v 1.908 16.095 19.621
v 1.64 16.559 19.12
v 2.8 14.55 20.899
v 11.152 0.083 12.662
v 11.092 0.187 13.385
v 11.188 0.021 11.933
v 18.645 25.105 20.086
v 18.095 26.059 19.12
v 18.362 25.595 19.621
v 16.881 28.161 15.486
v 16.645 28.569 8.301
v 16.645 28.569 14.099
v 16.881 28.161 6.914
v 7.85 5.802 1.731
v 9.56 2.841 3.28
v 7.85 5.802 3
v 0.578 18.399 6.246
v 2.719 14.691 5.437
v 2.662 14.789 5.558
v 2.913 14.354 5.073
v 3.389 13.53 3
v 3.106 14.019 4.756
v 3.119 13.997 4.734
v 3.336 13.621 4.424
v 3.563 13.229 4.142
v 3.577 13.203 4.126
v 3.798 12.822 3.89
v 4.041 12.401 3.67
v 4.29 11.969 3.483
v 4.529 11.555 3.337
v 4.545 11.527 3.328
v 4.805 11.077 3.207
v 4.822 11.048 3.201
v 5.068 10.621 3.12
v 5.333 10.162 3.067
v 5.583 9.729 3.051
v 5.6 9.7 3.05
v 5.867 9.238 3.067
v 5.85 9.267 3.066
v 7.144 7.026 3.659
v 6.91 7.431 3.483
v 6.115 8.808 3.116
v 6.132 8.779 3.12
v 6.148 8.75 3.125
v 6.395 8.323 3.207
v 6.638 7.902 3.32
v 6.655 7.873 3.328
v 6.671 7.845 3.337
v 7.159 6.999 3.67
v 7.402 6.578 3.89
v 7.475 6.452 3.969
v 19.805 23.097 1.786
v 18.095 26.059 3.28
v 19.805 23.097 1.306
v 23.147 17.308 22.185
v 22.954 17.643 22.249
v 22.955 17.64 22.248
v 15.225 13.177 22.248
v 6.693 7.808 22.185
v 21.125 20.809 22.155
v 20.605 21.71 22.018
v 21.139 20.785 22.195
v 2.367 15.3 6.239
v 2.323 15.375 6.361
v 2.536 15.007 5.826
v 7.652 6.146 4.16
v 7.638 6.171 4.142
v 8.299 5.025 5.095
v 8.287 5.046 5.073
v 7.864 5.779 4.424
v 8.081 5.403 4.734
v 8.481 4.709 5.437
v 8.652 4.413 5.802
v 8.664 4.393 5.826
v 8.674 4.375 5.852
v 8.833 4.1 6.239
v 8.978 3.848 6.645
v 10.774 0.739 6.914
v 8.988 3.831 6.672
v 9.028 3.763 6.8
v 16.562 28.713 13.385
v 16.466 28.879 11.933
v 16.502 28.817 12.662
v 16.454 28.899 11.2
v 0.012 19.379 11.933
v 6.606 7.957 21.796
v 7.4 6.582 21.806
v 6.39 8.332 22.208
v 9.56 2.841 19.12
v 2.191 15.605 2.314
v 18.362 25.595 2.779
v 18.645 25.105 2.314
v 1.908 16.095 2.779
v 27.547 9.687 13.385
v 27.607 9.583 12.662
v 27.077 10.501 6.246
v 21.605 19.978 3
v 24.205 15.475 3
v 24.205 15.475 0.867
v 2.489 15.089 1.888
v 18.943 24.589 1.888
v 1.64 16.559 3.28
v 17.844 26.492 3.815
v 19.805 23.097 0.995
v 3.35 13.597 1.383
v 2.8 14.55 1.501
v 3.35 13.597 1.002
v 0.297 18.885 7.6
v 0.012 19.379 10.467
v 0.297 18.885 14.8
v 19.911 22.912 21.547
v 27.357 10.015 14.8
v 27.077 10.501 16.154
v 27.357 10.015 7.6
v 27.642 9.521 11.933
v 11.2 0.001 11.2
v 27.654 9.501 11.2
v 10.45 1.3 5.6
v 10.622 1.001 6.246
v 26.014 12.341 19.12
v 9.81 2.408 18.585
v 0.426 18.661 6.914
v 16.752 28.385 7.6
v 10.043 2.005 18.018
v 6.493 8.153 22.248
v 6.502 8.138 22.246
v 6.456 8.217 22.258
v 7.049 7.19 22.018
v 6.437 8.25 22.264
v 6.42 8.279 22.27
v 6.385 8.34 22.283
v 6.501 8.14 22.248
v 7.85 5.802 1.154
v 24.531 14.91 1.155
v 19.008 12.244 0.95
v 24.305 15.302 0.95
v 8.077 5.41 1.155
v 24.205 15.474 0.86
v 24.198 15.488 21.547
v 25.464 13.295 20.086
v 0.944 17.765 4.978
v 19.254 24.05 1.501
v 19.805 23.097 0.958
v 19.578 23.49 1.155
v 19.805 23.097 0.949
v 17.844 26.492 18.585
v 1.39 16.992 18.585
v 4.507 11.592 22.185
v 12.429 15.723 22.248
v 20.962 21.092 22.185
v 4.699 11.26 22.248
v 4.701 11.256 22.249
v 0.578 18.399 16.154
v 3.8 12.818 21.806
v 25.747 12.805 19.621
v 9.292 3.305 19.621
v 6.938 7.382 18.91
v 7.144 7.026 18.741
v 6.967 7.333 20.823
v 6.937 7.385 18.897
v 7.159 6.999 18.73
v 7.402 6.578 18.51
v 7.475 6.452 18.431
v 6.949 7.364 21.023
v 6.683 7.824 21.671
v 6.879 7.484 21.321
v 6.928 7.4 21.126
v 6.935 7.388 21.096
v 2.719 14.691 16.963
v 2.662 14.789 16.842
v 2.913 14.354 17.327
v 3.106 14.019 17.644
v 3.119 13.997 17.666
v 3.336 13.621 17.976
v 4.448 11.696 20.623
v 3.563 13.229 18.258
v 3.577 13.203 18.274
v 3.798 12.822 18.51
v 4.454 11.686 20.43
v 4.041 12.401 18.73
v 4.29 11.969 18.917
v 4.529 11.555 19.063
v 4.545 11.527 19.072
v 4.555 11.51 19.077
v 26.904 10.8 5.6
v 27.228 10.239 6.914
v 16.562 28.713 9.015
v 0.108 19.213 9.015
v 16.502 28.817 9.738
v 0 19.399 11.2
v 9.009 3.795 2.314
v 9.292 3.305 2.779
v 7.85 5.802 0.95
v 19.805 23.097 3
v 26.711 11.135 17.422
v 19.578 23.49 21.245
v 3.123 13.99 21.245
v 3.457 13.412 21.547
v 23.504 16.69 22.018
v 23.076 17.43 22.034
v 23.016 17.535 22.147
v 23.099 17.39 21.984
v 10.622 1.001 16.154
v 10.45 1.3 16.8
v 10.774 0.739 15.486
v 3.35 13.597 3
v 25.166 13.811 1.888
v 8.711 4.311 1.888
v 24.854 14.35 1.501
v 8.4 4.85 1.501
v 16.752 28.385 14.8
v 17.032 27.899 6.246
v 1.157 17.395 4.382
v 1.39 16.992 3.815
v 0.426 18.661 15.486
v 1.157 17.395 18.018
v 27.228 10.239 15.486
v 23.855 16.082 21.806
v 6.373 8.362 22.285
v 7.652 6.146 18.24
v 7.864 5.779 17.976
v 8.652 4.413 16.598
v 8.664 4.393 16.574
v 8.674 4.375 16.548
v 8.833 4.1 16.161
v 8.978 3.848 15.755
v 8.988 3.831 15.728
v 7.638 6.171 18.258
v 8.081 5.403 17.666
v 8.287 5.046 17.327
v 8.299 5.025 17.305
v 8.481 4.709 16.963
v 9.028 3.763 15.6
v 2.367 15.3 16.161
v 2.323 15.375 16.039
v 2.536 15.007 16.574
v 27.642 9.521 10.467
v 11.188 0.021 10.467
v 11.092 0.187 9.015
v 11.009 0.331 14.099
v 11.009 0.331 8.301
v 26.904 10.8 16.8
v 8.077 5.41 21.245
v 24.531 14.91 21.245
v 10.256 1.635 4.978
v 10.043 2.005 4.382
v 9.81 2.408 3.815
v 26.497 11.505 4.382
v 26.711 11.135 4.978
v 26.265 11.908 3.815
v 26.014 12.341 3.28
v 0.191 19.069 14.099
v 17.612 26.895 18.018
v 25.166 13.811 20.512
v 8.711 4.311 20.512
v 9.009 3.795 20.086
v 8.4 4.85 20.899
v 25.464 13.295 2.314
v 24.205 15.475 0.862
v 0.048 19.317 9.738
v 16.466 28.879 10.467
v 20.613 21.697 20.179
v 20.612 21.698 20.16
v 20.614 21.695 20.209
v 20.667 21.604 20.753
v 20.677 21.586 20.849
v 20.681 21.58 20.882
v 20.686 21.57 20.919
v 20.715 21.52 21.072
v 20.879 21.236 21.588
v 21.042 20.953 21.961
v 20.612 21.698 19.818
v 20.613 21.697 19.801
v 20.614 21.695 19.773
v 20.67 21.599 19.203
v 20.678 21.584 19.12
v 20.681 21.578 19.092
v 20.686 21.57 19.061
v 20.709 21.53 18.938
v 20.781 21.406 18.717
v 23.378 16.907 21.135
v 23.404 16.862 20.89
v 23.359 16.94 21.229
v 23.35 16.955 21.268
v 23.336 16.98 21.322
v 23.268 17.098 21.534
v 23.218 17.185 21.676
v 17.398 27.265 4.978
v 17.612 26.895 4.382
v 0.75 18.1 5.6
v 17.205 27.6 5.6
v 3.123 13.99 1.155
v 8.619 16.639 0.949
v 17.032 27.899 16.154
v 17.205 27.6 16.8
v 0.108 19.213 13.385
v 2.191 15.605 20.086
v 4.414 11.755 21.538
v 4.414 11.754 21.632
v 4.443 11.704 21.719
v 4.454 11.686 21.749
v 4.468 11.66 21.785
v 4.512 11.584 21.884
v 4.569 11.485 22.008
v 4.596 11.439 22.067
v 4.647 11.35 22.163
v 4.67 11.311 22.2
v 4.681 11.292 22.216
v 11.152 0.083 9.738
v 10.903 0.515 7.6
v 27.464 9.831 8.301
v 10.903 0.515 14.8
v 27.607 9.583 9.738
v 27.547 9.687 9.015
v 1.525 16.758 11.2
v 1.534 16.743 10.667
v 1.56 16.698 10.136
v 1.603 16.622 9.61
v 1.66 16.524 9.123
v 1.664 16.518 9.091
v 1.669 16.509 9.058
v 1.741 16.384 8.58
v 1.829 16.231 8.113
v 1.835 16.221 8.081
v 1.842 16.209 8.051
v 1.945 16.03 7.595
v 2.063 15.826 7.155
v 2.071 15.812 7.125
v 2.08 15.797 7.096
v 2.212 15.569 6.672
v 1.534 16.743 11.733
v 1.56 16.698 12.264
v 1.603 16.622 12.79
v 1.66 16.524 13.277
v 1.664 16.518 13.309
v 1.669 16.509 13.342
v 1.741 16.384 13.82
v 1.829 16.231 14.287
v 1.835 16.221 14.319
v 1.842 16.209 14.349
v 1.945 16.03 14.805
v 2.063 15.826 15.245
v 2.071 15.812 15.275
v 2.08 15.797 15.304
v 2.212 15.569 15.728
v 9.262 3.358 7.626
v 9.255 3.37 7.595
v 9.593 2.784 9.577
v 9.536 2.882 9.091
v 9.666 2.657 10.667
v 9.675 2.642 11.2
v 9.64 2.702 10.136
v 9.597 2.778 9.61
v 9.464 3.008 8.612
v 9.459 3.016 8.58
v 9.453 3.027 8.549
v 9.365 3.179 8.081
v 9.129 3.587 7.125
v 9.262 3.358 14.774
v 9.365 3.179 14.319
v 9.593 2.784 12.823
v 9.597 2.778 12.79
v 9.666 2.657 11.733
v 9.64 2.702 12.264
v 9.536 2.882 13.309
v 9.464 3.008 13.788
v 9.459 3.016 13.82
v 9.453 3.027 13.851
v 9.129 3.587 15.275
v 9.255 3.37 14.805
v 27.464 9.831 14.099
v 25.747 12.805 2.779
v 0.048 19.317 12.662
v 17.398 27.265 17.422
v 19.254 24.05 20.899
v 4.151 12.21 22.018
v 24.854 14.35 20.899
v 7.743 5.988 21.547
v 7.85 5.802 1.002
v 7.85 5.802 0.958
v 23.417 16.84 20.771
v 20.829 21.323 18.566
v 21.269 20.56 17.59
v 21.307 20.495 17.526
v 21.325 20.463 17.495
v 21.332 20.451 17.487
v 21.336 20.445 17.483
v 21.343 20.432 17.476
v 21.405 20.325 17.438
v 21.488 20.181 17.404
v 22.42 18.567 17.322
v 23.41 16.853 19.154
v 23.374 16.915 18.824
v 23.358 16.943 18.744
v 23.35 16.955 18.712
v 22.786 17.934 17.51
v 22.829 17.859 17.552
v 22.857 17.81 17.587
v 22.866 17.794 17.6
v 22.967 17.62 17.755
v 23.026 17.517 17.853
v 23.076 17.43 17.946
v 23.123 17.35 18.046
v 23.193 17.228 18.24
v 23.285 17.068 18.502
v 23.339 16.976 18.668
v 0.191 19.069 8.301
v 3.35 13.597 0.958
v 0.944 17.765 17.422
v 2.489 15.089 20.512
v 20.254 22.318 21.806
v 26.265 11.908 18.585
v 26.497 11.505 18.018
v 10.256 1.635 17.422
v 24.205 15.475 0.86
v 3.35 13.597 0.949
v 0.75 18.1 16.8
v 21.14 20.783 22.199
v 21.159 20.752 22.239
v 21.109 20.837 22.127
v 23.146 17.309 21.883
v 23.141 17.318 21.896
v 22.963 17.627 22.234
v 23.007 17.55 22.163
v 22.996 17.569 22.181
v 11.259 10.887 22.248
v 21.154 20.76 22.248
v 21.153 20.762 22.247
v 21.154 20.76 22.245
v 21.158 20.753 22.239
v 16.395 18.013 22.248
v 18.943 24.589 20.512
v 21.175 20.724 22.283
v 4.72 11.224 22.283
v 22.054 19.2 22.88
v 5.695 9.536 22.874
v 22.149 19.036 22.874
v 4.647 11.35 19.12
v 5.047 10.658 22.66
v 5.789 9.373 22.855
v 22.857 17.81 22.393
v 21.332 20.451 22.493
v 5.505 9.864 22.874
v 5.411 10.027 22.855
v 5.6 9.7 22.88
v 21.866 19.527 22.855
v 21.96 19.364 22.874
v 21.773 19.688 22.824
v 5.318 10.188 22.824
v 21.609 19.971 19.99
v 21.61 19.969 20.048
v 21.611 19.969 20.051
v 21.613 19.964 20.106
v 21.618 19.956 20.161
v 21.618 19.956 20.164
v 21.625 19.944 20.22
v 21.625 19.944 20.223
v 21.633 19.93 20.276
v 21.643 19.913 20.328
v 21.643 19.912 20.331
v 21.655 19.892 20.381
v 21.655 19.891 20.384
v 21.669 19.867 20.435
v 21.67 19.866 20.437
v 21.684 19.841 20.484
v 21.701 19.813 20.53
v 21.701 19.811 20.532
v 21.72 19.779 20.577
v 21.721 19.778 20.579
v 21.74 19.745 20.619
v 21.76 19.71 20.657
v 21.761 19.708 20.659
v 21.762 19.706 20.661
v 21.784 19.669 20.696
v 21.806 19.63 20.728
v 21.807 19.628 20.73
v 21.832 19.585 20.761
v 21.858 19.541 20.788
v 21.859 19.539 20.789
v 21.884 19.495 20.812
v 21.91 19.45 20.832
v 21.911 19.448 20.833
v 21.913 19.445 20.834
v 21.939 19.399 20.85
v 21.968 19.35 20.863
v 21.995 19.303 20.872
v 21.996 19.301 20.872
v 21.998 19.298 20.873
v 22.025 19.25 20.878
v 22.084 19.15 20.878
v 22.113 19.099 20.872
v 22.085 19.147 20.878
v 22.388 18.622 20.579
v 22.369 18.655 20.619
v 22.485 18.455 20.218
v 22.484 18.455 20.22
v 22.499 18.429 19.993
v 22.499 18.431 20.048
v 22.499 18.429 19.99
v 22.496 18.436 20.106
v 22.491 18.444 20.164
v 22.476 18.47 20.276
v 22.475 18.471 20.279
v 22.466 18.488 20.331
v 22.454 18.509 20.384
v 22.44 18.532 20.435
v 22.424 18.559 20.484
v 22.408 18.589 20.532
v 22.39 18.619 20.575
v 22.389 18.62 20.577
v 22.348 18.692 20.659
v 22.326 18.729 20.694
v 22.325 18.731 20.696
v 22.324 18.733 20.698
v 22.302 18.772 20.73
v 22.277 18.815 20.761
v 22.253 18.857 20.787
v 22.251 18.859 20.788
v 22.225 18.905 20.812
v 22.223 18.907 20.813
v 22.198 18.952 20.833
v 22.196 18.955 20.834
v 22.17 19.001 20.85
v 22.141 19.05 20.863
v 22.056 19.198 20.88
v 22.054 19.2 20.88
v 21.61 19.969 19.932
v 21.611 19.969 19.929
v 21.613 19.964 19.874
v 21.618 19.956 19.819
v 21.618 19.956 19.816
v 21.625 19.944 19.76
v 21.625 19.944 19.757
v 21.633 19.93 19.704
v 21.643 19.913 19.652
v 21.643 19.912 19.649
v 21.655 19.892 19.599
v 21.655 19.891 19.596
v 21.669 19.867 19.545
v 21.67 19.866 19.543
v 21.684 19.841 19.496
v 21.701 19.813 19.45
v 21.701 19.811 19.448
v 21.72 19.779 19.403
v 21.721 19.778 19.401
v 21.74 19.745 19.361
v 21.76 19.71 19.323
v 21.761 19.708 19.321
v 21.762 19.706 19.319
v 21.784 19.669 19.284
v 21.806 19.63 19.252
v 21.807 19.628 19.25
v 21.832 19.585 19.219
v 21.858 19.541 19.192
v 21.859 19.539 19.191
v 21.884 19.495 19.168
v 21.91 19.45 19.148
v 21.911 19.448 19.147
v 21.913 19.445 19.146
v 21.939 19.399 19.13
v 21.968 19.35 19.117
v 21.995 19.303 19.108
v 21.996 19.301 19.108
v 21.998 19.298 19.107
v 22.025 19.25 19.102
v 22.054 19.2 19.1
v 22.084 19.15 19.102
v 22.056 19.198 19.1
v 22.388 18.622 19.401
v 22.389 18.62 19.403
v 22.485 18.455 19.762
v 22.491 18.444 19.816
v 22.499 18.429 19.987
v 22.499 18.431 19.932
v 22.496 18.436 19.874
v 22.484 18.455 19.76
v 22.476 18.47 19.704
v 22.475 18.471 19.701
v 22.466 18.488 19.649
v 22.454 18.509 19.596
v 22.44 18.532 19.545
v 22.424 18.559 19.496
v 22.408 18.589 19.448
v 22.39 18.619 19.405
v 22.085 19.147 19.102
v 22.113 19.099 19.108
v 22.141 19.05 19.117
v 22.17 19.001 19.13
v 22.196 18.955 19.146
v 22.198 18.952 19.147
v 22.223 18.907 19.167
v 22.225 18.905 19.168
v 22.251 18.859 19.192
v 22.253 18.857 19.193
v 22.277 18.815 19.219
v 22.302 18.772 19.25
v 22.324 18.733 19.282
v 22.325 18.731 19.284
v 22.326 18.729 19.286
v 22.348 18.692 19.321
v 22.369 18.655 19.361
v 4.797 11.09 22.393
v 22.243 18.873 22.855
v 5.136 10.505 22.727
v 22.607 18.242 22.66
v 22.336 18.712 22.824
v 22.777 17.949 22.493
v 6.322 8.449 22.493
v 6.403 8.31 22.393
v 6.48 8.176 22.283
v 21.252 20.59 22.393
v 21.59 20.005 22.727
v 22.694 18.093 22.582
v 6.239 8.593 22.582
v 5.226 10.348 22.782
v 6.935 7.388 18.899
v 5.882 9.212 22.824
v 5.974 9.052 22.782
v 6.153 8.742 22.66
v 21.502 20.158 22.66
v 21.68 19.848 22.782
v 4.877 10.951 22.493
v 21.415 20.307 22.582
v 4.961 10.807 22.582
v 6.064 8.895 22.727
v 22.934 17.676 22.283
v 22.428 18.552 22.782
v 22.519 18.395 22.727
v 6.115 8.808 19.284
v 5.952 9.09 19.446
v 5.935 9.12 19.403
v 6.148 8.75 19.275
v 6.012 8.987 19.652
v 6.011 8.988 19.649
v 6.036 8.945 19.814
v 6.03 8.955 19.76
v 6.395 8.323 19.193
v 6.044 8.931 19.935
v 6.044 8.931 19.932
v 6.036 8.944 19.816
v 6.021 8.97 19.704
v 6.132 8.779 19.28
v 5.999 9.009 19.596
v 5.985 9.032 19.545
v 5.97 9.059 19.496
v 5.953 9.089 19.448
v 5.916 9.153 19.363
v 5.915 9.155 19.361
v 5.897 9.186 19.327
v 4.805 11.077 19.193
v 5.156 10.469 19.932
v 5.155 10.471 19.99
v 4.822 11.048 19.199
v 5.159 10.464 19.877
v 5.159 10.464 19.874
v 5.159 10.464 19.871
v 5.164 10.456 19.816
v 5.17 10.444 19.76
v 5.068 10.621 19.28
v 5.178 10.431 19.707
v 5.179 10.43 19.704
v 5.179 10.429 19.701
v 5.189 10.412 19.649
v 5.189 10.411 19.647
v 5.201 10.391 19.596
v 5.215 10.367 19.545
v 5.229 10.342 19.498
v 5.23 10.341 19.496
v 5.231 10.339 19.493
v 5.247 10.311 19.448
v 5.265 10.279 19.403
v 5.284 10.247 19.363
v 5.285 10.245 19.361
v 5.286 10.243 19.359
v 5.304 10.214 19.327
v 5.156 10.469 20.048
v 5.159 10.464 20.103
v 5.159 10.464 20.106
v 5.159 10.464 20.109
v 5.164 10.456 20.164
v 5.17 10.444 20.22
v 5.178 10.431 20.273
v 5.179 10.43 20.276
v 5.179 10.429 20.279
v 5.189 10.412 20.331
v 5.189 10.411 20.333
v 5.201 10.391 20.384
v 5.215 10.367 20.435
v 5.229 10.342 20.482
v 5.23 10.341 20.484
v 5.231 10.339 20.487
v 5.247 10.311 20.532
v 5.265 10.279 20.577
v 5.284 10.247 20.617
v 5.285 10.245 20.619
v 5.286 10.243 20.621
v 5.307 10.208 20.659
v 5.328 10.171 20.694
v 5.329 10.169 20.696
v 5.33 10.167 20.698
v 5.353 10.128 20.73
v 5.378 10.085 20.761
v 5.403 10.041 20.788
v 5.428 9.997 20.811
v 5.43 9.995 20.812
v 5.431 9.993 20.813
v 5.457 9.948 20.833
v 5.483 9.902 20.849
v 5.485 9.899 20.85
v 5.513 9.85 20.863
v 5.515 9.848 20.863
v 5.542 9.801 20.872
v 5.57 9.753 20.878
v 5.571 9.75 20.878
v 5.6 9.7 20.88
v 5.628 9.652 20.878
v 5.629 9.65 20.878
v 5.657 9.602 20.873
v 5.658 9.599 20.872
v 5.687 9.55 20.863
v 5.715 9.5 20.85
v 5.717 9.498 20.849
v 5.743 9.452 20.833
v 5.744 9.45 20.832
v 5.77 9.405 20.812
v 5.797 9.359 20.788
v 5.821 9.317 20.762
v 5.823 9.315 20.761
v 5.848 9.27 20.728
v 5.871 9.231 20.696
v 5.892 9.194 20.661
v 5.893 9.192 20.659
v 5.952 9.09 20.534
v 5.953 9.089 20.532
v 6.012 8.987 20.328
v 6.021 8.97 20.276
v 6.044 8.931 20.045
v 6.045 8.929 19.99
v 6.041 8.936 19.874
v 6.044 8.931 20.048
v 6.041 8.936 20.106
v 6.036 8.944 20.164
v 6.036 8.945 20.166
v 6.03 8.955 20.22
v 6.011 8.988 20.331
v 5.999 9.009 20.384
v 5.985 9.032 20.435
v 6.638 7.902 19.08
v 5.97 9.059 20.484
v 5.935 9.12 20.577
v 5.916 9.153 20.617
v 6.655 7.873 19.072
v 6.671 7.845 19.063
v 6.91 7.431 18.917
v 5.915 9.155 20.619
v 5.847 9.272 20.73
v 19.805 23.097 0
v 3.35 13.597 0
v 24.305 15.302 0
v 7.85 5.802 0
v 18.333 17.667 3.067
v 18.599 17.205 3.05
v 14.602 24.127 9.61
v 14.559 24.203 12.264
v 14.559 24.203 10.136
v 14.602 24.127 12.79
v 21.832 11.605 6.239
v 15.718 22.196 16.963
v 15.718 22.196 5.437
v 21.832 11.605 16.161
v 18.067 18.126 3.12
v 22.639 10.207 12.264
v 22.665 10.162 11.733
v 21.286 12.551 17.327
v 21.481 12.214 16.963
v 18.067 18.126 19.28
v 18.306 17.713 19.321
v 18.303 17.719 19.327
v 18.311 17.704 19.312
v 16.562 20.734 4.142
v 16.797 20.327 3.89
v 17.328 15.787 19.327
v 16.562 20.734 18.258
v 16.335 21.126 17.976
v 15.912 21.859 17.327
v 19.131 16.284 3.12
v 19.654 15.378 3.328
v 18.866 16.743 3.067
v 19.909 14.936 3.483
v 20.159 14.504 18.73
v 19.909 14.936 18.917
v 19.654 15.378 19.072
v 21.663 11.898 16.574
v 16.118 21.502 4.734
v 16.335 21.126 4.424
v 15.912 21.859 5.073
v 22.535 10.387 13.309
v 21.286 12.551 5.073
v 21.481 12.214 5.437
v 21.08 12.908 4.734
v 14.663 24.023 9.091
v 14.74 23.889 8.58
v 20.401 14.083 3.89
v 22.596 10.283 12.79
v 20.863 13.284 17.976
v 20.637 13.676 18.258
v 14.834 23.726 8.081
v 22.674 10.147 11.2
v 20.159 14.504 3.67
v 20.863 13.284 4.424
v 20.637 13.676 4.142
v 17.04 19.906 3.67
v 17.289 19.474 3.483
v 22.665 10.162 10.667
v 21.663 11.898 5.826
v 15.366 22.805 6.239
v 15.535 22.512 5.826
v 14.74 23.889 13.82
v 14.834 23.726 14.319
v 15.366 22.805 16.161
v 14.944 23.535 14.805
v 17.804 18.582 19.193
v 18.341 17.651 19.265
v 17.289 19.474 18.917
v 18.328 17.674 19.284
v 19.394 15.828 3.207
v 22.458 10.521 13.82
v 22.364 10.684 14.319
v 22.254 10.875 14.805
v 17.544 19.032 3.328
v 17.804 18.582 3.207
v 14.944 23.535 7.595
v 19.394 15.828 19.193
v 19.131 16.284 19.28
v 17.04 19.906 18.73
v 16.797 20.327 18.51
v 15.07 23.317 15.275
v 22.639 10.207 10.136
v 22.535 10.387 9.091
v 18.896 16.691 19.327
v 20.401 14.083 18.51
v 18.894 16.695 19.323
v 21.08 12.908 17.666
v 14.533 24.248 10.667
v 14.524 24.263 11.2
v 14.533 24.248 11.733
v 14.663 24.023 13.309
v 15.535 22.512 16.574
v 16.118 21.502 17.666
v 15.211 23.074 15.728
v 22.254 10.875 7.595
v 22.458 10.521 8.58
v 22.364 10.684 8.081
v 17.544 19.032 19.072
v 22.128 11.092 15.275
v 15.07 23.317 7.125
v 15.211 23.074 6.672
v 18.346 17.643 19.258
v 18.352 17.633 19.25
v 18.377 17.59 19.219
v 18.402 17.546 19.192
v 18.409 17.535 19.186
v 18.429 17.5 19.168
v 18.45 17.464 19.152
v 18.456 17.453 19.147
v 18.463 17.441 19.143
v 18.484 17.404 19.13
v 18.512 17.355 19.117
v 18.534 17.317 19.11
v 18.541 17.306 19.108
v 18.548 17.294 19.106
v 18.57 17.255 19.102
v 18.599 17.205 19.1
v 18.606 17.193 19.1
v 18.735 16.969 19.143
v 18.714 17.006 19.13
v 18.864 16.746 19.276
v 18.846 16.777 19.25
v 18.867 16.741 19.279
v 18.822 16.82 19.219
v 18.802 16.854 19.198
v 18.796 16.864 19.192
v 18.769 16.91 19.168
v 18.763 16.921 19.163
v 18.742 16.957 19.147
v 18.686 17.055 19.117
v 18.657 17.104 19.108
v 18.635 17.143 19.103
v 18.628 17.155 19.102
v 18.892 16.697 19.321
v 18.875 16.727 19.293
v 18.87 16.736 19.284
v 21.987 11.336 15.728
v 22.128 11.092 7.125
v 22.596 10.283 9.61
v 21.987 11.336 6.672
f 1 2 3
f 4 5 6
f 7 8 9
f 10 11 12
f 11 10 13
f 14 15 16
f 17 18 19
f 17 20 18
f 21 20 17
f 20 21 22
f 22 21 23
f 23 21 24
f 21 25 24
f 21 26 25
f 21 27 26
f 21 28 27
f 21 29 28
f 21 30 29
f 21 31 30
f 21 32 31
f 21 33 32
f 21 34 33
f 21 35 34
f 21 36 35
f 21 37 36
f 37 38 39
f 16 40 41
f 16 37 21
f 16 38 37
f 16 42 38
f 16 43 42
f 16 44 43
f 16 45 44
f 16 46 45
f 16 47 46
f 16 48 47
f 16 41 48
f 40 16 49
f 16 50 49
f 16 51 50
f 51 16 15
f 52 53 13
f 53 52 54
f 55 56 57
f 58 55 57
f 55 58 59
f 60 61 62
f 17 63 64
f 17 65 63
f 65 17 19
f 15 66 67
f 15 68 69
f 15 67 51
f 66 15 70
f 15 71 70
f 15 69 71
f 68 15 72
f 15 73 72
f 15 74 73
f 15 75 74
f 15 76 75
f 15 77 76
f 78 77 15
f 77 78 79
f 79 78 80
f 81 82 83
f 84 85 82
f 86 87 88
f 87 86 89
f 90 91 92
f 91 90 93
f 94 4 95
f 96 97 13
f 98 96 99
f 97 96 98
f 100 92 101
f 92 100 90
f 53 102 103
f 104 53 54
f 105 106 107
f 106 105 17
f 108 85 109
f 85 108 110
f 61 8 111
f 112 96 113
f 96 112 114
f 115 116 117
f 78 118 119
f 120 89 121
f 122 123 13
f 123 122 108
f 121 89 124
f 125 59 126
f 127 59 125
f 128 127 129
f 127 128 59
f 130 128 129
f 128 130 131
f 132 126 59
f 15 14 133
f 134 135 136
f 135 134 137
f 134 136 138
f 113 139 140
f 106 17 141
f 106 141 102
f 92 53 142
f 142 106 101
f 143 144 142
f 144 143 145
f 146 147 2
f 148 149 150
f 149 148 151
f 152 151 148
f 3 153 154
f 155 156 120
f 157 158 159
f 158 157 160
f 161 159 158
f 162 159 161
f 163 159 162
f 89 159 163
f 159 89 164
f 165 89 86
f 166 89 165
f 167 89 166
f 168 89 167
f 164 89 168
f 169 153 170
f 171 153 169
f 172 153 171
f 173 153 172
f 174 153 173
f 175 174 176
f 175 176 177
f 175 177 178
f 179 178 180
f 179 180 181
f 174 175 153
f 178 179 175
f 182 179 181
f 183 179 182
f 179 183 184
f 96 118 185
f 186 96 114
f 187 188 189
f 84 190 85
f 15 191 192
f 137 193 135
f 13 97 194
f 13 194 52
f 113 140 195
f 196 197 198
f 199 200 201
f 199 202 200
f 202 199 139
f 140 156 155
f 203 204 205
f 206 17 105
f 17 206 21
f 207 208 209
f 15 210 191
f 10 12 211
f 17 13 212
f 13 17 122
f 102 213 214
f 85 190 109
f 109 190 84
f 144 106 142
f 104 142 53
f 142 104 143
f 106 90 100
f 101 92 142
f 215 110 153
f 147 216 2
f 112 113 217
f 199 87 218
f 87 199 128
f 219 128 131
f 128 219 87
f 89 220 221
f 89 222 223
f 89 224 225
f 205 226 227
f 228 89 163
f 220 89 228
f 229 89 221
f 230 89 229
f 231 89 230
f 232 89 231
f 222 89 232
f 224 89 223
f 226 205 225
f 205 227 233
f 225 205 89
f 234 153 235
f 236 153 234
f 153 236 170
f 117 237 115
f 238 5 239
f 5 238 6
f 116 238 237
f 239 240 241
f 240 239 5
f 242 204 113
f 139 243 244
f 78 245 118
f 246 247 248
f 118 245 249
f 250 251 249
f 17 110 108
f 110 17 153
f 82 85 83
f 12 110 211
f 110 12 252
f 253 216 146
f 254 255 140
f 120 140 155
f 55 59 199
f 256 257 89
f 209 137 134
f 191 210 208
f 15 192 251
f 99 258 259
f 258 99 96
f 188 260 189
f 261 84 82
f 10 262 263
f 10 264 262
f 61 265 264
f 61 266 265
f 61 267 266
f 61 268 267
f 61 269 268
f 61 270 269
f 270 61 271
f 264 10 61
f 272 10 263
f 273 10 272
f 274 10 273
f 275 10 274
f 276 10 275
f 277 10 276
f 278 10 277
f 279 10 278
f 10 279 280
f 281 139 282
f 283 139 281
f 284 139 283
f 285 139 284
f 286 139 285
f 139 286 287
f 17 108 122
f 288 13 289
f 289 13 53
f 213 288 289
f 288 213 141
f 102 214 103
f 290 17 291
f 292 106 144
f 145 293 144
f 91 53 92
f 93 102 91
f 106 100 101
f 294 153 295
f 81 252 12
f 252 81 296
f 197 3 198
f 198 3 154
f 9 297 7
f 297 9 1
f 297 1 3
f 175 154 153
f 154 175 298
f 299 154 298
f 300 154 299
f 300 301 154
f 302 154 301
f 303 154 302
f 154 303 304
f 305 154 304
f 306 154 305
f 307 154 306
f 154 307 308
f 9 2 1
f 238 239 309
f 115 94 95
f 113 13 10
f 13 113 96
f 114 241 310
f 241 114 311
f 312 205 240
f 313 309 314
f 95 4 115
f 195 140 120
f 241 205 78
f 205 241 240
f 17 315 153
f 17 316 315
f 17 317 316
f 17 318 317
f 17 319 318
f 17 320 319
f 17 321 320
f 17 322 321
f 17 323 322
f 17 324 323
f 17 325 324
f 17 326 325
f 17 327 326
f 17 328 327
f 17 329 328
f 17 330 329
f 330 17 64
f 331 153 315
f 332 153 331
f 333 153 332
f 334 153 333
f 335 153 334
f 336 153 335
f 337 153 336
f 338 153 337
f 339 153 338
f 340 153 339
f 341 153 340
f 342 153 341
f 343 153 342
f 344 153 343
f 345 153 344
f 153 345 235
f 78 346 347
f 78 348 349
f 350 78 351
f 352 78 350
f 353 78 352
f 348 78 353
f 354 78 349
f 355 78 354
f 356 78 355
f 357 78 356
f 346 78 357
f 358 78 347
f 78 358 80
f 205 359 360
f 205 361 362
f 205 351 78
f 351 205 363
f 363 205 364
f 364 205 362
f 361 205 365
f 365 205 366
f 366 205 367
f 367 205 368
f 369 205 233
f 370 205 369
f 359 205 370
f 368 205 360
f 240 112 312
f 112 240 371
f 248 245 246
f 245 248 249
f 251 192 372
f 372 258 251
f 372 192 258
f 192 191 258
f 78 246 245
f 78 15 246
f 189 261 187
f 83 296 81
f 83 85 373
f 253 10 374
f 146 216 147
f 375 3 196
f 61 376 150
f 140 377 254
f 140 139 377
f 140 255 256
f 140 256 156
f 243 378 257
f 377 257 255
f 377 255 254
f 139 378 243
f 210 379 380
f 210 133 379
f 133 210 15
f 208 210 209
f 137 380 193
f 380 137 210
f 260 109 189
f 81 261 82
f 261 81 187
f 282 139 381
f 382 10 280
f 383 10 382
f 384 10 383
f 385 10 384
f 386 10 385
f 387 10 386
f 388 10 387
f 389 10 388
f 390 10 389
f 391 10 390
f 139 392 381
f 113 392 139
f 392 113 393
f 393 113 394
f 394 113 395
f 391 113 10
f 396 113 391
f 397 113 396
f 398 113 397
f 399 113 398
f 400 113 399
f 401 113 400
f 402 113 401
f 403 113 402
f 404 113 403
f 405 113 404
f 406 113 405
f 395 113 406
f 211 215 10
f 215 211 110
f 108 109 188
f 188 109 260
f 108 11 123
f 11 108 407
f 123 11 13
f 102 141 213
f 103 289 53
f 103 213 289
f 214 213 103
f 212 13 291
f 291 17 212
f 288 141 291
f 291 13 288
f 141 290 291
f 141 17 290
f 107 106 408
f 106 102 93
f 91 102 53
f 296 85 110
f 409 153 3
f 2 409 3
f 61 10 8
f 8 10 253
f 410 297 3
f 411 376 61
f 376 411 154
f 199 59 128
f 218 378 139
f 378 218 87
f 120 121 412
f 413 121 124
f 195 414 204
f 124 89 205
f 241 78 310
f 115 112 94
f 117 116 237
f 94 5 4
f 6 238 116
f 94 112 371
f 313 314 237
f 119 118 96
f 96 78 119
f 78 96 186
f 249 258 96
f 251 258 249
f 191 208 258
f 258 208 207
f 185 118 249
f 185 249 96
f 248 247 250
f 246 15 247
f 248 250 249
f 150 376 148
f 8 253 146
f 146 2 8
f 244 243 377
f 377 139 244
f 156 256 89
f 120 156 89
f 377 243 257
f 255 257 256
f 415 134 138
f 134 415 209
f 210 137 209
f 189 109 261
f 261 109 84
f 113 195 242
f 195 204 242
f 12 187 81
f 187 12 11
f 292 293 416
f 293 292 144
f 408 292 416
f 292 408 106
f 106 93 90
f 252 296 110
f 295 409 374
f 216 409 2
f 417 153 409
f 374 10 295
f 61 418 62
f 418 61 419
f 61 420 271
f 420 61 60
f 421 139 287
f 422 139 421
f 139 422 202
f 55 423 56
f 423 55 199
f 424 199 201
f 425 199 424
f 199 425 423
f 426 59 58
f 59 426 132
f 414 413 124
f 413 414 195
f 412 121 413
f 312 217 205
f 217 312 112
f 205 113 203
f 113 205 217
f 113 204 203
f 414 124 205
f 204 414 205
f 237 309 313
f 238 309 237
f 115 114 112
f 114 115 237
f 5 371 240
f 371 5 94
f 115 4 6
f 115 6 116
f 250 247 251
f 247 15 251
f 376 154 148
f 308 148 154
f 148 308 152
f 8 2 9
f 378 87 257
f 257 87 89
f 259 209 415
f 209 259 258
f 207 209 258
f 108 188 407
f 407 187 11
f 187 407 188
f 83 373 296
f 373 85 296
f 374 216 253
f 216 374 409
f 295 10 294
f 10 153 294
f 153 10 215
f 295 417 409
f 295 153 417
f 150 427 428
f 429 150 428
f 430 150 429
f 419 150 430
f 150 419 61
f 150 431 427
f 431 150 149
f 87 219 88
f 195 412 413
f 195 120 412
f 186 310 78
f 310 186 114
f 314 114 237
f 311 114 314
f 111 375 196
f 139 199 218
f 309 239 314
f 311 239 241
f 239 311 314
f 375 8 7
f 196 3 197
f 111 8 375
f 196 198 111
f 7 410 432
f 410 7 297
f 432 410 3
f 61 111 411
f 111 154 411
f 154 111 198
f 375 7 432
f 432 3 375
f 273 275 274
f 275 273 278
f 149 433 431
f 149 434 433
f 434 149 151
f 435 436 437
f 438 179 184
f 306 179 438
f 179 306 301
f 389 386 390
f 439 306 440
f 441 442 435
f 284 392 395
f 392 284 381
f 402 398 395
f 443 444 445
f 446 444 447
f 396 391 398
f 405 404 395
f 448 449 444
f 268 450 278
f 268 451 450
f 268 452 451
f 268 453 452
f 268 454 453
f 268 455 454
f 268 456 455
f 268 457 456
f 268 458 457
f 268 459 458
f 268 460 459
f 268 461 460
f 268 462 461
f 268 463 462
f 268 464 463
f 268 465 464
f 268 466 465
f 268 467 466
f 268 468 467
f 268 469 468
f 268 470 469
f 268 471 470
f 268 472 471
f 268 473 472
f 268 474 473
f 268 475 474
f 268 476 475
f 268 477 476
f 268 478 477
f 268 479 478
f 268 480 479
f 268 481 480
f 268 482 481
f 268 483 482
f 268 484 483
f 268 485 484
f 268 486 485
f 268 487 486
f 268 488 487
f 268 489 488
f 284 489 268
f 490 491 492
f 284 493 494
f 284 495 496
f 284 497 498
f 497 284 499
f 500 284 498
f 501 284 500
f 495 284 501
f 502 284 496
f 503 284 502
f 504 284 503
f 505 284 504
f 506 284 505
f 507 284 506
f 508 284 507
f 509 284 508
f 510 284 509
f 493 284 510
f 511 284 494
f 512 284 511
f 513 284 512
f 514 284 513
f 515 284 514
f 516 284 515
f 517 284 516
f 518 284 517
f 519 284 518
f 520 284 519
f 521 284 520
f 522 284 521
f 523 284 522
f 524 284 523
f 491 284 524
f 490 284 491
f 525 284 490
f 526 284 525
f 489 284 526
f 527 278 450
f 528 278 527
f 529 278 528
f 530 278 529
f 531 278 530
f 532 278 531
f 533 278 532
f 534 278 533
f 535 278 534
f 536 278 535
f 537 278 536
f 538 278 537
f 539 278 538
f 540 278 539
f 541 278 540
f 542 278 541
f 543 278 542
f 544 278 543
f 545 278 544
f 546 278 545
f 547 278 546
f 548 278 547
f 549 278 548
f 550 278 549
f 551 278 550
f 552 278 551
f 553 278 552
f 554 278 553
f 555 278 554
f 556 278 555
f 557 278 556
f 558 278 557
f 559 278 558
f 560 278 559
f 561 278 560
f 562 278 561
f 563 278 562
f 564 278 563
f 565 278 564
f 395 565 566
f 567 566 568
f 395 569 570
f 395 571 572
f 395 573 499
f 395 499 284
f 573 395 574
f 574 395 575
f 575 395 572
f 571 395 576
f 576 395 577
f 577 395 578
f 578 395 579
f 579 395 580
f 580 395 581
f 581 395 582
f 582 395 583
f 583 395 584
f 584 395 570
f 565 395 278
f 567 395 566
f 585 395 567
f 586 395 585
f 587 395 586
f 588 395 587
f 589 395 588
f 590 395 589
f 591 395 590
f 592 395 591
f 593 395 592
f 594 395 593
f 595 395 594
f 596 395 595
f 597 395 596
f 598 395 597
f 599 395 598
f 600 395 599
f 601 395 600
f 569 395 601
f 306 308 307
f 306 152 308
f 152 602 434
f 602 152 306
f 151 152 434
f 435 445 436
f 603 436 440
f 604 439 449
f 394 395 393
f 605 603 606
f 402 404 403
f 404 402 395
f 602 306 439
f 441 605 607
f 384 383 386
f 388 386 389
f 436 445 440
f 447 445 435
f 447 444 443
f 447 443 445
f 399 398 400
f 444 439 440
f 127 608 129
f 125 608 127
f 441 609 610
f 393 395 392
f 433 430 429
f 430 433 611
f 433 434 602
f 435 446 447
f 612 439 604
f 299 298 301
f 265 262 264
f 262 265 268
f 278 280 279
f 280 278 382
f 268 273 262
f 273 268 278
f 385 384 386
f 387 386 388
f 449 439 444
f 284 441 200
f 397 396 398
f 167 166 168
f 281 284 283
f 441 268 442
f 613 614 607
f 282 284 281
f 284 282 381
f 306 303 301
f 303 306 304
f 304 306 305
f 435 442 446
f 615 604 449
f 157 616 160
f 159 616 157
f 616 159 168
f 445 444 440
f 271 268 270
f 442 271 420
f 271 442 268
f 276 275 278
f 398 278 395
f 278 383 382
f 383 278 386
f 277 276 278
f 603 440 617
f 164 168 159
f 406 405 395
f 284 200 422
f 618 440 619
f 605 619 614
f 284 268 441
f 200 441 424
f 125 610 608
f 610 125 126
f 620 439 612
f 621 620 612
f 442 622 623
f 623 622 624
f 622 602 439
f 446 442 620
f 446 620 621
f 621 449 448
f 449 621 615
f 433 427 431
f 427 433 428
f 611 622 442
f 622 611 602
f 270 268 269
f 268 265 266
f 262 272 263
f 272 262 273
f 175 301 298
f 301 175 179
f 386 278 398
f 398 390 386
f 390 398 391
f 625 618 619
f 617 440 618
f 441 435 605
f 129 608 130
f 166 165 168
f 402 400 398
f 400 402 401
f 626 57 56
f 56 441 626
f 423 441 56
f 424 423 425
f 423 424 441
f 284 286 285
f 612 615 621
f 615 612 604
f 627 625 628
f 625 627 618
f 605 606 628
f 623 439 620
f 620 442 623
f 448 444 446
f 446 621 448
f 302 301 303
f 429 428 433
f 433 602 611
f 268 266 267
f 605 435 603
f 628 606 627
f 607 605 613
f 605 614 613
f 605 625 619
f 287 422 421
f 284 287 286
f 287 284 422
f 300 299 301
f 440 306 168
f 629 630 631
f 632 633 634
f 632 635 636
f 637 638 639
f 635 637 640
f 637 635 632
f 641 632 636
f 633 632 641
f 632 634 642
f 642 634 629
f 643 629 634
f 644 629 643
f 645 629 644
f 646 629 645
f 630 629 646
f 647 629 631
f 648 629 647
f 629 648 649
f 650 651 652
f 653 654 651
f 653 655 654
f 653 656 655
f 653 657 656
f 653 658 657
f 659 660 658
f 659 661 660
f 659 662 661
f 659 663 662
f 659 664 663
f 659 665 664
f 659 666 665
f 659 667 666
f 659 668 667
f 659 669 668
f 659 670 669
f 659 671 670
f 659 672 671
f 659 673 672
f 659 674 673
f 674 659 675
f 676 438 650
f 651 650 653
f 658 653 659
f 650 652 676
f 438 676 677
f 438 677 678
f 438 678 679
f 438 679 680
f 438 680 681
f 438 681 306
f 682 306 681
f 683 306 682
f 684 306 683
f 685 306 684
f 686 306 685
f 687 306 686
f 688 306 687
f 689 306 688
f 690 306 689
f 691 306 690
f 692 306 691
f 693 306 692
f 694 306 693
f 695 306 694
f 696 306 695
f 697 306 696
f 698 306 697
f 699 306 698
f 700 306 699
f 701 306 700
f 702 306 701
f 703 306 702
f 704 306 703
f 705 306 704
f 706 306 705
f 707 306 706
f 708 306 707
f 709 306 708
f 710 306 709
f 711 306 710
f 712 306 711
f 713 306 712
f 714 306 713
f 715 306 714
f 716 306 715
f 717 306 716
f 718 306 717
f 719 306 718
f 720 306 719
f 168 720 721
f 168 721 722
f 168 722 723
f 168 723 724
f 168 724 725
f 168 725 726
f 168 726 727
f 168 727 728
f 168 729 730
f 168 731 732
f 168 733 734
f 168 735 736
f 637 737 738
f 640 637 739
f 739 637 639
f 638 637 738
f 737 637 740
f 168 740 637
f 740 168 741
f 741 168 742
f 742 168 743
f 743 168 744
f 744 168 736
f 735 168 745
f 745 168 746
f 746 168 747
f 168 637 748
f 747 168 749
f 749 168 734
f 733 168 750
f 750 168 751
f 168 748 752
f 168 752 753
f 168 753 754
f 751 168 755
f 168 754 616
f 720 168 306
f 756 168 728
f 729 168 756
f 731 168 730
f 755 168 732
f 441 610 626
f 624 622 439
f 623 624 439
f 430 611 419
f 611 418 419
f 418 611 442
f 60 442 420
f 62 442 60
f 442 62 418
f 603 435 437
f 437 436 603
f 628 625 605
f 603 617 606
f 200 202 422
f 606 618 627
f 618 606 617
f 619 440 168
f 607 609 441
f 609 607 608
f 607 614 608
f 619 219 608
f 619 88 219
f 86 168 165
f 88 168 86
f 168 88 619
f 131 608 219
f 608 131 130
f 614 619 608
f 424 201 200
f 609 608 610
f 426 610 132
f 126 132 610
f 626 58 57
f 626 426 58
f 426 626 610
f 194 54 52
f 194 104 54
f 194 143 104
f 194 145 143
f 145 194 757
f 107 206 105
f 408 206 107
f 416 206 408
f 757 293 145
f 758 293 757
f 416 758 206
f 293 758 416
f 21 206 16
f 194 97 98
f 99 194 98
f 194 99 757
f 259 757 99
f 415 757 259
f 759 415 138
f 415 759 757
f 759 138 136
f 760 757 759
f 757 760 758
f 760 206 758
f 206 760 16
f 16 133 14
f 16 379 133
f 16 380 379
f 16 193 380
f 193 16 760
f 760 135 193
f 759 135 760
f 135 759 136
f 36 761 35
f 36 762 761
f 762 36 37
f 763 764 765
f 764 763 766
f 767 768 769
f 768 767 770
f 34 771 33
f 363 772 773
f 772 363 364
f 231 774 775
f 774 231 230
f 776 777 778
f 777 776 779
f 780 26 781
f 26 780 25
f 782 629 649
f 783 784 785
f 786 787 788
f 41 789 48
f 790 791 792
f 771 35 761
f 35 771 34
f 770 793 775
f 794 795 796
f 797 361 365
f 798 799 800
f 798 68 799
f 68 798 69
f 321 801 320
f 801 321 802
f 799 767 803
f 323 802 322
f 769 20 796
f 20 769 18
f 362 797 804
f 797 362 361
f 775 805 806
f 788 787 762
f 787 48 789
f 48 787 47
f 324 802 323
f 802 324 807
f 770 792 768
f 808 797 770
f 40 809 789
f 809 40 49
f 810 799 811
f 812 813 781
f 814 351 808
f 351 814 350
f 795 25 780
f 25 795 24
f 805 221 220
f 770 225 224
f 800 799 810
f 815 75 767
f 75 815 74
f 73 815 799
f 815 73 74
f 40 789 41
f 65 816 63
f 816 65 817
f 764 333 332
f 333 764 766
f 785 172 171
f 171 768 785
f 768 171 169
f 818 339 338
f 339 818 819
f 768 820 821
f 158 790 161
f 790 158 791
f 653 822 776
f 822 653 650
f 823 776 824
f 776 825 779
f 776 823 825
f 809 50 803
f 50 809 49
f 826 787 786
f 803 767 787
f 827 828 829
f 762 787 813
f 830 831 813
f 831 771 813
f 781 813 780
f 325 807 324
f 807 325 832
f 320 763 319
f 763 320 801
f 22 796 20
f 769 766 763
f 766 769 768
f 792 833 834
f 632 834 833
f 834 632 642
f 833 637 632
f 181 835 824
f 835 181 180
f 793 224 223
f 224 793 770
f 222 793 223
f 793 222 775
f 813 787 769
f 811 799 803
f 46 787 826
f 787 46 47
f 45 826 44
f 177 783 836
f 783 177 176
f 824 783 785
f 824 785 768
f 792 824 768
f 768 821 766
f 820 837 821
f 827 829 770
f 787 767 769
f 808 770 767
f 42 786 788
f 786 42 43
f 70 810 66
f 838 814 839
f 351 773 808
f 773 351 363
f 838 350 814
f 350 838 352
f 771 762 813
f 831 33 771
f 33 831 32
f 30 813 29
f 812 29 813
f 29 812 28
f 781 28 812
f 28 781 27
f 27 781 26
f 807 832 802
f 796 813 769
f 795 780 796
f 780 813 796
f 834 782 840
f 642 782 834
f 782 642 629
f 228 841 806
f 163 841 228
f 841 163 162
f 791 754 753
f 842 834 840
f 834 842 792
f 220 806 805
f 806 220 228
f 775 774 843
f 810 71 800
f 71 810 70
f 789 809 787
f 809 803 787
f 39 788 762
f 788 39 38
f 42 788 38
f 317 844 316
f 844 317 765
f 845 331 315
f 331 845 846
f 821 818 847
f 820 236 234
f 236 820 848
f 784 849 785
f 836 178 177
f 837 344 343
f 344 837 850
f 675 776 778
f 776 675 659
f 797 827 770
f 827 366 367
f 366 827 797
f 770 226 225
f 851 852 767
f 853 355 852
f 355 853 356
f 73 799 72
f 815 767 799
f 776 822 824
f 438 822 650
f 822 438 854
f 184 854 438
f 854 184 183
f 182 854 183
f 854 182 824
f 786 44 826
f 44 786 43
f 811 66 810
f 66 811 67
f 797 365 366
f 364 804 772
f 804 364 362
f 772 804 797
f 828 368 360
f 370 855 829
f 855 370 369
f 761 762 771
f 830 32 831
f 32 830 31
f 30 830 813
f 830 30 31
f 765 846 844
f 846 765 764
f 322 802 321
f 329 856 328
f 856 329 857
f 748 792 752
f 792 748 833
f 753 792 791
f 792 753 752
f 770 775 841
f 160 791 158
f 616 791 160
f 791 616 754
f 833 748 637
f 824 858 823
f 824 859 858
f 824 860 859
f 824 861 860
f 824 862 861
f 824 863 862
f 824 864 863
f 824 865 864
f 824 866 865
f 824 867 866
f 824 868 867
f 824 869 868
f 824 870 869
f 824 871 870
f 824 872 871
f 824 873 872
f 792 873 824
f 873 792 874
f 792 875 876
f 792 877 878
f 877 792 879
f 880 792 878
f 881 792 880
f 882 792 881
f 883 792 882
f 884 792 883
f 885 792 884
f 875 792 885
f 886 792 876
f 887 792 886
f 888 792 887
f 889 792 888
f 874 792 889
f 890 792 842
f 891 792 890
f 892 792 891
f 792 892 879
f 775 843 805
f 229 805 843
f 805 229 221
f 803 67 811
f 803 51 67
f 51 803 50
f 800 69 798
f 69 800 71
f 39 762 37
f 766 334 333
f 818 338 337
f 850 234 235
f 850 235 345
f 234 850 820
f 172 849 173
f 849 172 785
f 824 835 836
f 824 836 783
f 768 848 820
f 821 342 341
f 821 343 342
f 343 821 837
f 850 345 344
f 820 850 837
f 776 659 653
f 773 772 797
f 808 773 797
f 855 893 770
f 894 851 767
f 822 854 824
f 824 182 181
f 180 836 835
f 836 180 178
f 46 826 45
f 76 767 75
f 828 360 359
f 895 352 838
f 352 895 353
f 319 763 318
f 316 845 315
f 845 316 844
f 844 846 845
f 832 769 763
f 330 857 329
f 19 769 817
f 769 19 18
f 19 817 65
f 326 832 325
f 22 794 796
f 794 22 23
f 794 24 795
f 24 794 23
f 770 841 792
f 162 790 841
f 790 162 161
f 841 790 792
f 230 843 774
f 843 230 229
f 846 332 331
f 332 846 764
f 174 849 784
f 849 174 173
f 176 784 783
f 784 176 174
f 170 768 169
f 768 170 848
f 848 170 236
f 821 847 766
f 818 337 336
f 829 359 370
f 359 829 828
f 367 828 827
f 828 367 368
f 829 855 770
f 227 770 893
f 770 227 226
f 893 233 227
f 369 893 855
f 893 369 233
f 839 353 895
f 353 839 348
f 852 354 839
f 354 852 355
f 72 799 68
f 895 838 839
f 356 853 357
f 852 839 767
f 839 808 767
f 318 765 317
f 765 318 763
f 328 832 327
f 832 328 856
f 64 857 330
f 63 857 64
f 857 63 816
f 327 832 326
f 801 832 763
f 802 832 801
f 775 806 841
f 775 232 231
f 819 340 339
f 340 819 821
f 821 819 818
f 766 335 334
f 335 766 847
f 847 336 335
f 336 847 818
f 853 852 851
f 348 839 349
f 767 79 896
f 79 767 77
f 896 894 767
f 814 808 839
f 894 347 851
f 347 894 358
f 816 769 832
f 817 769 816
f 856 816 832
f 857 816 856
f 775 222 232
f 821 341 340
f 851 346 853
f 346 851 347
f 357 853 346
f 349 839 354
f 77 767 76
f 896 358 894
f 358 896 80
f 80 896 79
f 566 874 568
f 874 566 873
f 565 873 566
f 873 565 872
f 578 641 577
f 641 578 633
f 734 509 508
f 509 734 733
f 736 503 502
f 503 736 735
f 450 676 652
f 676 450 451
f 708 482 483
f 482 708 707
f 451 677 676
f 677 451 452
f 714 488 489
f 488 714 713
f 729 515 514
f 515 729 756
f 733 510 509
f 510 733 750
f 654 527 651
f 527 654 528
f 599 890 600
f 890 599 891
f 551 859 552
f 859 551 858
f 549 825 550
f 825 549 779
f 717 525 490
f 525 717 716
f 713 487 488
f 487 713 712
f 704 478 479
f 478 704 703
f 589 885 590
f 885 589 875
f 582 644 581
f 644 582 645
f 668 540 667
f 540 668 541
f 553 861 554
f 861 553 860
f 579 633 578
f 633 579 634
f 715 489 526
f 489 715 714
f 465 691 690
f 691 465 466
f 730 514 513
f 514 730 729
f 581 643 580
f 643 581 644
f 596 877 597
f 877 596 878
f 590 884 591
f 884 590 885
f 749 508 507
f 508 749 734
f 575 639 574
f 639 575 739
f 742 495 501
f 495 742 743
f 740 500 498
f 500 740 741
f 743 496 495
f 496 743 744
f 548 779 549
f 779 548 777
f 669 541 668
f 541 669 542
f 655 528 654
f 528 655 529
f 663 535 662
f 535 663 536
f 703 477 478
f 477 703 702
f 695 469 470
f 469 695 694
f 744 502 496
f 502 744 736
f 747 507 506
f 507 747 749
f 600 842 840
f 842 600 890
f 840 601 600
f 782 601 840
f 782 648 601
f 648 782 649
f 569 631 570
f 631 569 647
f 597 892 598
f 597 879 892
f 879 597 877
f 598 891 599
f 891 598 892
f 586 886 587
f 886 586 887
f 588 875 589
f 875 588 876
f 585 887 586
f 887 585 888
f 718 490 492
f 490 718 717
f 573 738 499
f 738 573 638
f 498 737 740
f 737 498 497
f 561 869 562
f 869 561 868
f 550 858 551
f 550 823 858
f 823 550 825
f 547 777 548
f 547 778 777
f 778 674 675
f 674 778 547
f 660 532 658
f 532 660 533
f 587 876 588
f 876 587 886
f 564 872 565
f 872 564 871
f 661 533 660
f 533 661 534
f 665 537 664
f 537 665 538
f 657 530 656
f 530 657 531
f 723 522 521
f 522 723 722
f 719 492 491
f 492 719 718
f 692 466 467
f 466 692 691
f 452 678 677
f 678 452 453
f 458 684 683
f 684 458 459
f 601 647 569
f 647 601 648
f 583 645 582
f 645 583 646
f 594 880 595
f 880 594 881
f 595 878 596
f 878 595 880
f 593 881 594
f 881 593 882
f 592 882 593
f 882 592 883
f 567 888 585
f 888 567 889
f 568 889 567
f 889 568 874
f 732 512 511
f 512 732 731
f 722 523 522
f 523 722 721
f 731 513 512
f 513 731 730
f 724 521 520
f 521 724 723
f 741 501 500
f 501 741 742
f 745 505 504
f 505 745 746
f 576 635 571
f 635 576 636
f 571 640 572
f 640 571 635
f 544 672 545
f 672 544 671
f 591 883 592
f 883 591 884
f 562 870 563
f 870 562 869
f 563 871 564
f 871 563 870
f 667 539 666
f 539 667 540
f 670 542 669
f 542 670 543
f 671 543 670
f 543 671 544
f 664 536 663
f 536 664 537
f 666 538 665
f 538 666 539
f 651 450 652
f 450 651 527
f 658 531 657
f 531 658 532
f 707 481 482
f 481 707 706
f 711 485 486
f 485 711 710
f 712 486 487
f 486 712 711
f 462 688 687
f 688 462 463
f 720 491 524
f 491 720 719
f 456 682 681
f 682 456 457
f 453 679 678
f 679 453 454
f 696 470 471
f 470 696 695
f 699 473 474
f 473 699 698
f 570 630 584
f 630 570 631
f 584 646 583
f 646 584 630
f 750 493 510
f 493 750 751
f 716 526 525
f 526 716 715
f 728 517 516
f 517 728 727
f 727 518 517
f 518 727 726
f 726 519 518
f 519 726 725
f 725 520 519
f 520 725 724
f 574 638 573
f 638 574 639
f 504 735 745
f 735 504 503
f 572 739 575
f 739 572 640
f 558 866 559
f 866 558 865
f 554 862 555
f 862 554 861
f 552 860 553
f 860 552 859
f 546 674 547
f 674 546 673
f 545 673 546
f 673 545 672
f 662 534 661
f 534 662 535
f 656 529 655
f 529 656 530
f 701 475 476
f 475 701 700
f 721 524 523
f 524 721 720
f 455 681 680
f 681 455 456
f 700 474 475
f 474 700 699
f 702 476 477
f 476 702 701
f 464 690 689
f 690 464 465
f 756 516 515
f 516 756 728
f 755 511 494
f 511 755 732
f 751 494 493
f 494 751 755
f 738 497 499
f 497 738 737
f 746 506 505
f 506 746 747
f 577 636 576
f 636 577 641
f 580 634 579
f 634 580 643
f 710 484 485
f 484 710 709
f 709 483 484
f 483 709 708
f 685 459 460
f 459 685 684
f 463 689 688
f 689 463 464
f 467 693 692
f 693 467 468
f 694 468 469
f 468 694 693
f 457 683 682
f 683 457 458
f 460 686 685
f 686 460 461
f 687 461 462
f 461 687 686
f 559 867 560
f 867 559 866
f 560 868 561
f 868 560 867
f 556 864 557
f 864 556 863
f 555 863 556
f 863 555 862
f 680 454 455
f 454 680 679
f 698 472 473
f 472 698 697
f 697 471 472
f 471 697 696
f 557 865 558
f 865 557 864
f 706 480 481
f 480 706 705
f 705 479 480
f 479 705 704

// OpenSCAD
// Tip cap (cap) for 137 MHz V-dipole for weather satellites
// PETG, 0.2 mm layers, 4 walls, 60% infill, no supports
// Print it: as modelled: lying on its flat foot, the socket and end wall standing up; no supports (the top of the socket bridges)
// Generated by the blueprint skill from the plan at its current size. Units: mm.
$fn = 96;
translate([-433.396, -243.755, -1002.5])
difference() {
  union() {
    translate([438.996, 253.455, 1013.7]) rotate([0, 90.000, 30.000]) translate([0, 0, 0]) cylinder(h = 19.000, r = 11.200);
    translate([438.996, 253.455, 1022.49]) rotate([0, 90.000, 30.000]) translate([0, 0, 0]) cylinder(h = 19.000, r = 2.890);
    translate([0, 0, 1002.500]) linear_extrude(height = 3.000) polygon([[441.246,249.557],[457.701,259.057],[453.201,266.852],[436.746,257.352]]);
  }
  translate([438.13, 252.955, 1013.7]) rotate([0, 90.000, 30.000]) translate([0, 0, -0.01]) cylinder(h = 16.020, r = 8.150);
  translate([438.13, 252.955, 1022.49]) rotate([0, 90.000, 30.000]) translate([0, 0, -0.01]) cylinder(h = 21.020, r = 0.890);
}
